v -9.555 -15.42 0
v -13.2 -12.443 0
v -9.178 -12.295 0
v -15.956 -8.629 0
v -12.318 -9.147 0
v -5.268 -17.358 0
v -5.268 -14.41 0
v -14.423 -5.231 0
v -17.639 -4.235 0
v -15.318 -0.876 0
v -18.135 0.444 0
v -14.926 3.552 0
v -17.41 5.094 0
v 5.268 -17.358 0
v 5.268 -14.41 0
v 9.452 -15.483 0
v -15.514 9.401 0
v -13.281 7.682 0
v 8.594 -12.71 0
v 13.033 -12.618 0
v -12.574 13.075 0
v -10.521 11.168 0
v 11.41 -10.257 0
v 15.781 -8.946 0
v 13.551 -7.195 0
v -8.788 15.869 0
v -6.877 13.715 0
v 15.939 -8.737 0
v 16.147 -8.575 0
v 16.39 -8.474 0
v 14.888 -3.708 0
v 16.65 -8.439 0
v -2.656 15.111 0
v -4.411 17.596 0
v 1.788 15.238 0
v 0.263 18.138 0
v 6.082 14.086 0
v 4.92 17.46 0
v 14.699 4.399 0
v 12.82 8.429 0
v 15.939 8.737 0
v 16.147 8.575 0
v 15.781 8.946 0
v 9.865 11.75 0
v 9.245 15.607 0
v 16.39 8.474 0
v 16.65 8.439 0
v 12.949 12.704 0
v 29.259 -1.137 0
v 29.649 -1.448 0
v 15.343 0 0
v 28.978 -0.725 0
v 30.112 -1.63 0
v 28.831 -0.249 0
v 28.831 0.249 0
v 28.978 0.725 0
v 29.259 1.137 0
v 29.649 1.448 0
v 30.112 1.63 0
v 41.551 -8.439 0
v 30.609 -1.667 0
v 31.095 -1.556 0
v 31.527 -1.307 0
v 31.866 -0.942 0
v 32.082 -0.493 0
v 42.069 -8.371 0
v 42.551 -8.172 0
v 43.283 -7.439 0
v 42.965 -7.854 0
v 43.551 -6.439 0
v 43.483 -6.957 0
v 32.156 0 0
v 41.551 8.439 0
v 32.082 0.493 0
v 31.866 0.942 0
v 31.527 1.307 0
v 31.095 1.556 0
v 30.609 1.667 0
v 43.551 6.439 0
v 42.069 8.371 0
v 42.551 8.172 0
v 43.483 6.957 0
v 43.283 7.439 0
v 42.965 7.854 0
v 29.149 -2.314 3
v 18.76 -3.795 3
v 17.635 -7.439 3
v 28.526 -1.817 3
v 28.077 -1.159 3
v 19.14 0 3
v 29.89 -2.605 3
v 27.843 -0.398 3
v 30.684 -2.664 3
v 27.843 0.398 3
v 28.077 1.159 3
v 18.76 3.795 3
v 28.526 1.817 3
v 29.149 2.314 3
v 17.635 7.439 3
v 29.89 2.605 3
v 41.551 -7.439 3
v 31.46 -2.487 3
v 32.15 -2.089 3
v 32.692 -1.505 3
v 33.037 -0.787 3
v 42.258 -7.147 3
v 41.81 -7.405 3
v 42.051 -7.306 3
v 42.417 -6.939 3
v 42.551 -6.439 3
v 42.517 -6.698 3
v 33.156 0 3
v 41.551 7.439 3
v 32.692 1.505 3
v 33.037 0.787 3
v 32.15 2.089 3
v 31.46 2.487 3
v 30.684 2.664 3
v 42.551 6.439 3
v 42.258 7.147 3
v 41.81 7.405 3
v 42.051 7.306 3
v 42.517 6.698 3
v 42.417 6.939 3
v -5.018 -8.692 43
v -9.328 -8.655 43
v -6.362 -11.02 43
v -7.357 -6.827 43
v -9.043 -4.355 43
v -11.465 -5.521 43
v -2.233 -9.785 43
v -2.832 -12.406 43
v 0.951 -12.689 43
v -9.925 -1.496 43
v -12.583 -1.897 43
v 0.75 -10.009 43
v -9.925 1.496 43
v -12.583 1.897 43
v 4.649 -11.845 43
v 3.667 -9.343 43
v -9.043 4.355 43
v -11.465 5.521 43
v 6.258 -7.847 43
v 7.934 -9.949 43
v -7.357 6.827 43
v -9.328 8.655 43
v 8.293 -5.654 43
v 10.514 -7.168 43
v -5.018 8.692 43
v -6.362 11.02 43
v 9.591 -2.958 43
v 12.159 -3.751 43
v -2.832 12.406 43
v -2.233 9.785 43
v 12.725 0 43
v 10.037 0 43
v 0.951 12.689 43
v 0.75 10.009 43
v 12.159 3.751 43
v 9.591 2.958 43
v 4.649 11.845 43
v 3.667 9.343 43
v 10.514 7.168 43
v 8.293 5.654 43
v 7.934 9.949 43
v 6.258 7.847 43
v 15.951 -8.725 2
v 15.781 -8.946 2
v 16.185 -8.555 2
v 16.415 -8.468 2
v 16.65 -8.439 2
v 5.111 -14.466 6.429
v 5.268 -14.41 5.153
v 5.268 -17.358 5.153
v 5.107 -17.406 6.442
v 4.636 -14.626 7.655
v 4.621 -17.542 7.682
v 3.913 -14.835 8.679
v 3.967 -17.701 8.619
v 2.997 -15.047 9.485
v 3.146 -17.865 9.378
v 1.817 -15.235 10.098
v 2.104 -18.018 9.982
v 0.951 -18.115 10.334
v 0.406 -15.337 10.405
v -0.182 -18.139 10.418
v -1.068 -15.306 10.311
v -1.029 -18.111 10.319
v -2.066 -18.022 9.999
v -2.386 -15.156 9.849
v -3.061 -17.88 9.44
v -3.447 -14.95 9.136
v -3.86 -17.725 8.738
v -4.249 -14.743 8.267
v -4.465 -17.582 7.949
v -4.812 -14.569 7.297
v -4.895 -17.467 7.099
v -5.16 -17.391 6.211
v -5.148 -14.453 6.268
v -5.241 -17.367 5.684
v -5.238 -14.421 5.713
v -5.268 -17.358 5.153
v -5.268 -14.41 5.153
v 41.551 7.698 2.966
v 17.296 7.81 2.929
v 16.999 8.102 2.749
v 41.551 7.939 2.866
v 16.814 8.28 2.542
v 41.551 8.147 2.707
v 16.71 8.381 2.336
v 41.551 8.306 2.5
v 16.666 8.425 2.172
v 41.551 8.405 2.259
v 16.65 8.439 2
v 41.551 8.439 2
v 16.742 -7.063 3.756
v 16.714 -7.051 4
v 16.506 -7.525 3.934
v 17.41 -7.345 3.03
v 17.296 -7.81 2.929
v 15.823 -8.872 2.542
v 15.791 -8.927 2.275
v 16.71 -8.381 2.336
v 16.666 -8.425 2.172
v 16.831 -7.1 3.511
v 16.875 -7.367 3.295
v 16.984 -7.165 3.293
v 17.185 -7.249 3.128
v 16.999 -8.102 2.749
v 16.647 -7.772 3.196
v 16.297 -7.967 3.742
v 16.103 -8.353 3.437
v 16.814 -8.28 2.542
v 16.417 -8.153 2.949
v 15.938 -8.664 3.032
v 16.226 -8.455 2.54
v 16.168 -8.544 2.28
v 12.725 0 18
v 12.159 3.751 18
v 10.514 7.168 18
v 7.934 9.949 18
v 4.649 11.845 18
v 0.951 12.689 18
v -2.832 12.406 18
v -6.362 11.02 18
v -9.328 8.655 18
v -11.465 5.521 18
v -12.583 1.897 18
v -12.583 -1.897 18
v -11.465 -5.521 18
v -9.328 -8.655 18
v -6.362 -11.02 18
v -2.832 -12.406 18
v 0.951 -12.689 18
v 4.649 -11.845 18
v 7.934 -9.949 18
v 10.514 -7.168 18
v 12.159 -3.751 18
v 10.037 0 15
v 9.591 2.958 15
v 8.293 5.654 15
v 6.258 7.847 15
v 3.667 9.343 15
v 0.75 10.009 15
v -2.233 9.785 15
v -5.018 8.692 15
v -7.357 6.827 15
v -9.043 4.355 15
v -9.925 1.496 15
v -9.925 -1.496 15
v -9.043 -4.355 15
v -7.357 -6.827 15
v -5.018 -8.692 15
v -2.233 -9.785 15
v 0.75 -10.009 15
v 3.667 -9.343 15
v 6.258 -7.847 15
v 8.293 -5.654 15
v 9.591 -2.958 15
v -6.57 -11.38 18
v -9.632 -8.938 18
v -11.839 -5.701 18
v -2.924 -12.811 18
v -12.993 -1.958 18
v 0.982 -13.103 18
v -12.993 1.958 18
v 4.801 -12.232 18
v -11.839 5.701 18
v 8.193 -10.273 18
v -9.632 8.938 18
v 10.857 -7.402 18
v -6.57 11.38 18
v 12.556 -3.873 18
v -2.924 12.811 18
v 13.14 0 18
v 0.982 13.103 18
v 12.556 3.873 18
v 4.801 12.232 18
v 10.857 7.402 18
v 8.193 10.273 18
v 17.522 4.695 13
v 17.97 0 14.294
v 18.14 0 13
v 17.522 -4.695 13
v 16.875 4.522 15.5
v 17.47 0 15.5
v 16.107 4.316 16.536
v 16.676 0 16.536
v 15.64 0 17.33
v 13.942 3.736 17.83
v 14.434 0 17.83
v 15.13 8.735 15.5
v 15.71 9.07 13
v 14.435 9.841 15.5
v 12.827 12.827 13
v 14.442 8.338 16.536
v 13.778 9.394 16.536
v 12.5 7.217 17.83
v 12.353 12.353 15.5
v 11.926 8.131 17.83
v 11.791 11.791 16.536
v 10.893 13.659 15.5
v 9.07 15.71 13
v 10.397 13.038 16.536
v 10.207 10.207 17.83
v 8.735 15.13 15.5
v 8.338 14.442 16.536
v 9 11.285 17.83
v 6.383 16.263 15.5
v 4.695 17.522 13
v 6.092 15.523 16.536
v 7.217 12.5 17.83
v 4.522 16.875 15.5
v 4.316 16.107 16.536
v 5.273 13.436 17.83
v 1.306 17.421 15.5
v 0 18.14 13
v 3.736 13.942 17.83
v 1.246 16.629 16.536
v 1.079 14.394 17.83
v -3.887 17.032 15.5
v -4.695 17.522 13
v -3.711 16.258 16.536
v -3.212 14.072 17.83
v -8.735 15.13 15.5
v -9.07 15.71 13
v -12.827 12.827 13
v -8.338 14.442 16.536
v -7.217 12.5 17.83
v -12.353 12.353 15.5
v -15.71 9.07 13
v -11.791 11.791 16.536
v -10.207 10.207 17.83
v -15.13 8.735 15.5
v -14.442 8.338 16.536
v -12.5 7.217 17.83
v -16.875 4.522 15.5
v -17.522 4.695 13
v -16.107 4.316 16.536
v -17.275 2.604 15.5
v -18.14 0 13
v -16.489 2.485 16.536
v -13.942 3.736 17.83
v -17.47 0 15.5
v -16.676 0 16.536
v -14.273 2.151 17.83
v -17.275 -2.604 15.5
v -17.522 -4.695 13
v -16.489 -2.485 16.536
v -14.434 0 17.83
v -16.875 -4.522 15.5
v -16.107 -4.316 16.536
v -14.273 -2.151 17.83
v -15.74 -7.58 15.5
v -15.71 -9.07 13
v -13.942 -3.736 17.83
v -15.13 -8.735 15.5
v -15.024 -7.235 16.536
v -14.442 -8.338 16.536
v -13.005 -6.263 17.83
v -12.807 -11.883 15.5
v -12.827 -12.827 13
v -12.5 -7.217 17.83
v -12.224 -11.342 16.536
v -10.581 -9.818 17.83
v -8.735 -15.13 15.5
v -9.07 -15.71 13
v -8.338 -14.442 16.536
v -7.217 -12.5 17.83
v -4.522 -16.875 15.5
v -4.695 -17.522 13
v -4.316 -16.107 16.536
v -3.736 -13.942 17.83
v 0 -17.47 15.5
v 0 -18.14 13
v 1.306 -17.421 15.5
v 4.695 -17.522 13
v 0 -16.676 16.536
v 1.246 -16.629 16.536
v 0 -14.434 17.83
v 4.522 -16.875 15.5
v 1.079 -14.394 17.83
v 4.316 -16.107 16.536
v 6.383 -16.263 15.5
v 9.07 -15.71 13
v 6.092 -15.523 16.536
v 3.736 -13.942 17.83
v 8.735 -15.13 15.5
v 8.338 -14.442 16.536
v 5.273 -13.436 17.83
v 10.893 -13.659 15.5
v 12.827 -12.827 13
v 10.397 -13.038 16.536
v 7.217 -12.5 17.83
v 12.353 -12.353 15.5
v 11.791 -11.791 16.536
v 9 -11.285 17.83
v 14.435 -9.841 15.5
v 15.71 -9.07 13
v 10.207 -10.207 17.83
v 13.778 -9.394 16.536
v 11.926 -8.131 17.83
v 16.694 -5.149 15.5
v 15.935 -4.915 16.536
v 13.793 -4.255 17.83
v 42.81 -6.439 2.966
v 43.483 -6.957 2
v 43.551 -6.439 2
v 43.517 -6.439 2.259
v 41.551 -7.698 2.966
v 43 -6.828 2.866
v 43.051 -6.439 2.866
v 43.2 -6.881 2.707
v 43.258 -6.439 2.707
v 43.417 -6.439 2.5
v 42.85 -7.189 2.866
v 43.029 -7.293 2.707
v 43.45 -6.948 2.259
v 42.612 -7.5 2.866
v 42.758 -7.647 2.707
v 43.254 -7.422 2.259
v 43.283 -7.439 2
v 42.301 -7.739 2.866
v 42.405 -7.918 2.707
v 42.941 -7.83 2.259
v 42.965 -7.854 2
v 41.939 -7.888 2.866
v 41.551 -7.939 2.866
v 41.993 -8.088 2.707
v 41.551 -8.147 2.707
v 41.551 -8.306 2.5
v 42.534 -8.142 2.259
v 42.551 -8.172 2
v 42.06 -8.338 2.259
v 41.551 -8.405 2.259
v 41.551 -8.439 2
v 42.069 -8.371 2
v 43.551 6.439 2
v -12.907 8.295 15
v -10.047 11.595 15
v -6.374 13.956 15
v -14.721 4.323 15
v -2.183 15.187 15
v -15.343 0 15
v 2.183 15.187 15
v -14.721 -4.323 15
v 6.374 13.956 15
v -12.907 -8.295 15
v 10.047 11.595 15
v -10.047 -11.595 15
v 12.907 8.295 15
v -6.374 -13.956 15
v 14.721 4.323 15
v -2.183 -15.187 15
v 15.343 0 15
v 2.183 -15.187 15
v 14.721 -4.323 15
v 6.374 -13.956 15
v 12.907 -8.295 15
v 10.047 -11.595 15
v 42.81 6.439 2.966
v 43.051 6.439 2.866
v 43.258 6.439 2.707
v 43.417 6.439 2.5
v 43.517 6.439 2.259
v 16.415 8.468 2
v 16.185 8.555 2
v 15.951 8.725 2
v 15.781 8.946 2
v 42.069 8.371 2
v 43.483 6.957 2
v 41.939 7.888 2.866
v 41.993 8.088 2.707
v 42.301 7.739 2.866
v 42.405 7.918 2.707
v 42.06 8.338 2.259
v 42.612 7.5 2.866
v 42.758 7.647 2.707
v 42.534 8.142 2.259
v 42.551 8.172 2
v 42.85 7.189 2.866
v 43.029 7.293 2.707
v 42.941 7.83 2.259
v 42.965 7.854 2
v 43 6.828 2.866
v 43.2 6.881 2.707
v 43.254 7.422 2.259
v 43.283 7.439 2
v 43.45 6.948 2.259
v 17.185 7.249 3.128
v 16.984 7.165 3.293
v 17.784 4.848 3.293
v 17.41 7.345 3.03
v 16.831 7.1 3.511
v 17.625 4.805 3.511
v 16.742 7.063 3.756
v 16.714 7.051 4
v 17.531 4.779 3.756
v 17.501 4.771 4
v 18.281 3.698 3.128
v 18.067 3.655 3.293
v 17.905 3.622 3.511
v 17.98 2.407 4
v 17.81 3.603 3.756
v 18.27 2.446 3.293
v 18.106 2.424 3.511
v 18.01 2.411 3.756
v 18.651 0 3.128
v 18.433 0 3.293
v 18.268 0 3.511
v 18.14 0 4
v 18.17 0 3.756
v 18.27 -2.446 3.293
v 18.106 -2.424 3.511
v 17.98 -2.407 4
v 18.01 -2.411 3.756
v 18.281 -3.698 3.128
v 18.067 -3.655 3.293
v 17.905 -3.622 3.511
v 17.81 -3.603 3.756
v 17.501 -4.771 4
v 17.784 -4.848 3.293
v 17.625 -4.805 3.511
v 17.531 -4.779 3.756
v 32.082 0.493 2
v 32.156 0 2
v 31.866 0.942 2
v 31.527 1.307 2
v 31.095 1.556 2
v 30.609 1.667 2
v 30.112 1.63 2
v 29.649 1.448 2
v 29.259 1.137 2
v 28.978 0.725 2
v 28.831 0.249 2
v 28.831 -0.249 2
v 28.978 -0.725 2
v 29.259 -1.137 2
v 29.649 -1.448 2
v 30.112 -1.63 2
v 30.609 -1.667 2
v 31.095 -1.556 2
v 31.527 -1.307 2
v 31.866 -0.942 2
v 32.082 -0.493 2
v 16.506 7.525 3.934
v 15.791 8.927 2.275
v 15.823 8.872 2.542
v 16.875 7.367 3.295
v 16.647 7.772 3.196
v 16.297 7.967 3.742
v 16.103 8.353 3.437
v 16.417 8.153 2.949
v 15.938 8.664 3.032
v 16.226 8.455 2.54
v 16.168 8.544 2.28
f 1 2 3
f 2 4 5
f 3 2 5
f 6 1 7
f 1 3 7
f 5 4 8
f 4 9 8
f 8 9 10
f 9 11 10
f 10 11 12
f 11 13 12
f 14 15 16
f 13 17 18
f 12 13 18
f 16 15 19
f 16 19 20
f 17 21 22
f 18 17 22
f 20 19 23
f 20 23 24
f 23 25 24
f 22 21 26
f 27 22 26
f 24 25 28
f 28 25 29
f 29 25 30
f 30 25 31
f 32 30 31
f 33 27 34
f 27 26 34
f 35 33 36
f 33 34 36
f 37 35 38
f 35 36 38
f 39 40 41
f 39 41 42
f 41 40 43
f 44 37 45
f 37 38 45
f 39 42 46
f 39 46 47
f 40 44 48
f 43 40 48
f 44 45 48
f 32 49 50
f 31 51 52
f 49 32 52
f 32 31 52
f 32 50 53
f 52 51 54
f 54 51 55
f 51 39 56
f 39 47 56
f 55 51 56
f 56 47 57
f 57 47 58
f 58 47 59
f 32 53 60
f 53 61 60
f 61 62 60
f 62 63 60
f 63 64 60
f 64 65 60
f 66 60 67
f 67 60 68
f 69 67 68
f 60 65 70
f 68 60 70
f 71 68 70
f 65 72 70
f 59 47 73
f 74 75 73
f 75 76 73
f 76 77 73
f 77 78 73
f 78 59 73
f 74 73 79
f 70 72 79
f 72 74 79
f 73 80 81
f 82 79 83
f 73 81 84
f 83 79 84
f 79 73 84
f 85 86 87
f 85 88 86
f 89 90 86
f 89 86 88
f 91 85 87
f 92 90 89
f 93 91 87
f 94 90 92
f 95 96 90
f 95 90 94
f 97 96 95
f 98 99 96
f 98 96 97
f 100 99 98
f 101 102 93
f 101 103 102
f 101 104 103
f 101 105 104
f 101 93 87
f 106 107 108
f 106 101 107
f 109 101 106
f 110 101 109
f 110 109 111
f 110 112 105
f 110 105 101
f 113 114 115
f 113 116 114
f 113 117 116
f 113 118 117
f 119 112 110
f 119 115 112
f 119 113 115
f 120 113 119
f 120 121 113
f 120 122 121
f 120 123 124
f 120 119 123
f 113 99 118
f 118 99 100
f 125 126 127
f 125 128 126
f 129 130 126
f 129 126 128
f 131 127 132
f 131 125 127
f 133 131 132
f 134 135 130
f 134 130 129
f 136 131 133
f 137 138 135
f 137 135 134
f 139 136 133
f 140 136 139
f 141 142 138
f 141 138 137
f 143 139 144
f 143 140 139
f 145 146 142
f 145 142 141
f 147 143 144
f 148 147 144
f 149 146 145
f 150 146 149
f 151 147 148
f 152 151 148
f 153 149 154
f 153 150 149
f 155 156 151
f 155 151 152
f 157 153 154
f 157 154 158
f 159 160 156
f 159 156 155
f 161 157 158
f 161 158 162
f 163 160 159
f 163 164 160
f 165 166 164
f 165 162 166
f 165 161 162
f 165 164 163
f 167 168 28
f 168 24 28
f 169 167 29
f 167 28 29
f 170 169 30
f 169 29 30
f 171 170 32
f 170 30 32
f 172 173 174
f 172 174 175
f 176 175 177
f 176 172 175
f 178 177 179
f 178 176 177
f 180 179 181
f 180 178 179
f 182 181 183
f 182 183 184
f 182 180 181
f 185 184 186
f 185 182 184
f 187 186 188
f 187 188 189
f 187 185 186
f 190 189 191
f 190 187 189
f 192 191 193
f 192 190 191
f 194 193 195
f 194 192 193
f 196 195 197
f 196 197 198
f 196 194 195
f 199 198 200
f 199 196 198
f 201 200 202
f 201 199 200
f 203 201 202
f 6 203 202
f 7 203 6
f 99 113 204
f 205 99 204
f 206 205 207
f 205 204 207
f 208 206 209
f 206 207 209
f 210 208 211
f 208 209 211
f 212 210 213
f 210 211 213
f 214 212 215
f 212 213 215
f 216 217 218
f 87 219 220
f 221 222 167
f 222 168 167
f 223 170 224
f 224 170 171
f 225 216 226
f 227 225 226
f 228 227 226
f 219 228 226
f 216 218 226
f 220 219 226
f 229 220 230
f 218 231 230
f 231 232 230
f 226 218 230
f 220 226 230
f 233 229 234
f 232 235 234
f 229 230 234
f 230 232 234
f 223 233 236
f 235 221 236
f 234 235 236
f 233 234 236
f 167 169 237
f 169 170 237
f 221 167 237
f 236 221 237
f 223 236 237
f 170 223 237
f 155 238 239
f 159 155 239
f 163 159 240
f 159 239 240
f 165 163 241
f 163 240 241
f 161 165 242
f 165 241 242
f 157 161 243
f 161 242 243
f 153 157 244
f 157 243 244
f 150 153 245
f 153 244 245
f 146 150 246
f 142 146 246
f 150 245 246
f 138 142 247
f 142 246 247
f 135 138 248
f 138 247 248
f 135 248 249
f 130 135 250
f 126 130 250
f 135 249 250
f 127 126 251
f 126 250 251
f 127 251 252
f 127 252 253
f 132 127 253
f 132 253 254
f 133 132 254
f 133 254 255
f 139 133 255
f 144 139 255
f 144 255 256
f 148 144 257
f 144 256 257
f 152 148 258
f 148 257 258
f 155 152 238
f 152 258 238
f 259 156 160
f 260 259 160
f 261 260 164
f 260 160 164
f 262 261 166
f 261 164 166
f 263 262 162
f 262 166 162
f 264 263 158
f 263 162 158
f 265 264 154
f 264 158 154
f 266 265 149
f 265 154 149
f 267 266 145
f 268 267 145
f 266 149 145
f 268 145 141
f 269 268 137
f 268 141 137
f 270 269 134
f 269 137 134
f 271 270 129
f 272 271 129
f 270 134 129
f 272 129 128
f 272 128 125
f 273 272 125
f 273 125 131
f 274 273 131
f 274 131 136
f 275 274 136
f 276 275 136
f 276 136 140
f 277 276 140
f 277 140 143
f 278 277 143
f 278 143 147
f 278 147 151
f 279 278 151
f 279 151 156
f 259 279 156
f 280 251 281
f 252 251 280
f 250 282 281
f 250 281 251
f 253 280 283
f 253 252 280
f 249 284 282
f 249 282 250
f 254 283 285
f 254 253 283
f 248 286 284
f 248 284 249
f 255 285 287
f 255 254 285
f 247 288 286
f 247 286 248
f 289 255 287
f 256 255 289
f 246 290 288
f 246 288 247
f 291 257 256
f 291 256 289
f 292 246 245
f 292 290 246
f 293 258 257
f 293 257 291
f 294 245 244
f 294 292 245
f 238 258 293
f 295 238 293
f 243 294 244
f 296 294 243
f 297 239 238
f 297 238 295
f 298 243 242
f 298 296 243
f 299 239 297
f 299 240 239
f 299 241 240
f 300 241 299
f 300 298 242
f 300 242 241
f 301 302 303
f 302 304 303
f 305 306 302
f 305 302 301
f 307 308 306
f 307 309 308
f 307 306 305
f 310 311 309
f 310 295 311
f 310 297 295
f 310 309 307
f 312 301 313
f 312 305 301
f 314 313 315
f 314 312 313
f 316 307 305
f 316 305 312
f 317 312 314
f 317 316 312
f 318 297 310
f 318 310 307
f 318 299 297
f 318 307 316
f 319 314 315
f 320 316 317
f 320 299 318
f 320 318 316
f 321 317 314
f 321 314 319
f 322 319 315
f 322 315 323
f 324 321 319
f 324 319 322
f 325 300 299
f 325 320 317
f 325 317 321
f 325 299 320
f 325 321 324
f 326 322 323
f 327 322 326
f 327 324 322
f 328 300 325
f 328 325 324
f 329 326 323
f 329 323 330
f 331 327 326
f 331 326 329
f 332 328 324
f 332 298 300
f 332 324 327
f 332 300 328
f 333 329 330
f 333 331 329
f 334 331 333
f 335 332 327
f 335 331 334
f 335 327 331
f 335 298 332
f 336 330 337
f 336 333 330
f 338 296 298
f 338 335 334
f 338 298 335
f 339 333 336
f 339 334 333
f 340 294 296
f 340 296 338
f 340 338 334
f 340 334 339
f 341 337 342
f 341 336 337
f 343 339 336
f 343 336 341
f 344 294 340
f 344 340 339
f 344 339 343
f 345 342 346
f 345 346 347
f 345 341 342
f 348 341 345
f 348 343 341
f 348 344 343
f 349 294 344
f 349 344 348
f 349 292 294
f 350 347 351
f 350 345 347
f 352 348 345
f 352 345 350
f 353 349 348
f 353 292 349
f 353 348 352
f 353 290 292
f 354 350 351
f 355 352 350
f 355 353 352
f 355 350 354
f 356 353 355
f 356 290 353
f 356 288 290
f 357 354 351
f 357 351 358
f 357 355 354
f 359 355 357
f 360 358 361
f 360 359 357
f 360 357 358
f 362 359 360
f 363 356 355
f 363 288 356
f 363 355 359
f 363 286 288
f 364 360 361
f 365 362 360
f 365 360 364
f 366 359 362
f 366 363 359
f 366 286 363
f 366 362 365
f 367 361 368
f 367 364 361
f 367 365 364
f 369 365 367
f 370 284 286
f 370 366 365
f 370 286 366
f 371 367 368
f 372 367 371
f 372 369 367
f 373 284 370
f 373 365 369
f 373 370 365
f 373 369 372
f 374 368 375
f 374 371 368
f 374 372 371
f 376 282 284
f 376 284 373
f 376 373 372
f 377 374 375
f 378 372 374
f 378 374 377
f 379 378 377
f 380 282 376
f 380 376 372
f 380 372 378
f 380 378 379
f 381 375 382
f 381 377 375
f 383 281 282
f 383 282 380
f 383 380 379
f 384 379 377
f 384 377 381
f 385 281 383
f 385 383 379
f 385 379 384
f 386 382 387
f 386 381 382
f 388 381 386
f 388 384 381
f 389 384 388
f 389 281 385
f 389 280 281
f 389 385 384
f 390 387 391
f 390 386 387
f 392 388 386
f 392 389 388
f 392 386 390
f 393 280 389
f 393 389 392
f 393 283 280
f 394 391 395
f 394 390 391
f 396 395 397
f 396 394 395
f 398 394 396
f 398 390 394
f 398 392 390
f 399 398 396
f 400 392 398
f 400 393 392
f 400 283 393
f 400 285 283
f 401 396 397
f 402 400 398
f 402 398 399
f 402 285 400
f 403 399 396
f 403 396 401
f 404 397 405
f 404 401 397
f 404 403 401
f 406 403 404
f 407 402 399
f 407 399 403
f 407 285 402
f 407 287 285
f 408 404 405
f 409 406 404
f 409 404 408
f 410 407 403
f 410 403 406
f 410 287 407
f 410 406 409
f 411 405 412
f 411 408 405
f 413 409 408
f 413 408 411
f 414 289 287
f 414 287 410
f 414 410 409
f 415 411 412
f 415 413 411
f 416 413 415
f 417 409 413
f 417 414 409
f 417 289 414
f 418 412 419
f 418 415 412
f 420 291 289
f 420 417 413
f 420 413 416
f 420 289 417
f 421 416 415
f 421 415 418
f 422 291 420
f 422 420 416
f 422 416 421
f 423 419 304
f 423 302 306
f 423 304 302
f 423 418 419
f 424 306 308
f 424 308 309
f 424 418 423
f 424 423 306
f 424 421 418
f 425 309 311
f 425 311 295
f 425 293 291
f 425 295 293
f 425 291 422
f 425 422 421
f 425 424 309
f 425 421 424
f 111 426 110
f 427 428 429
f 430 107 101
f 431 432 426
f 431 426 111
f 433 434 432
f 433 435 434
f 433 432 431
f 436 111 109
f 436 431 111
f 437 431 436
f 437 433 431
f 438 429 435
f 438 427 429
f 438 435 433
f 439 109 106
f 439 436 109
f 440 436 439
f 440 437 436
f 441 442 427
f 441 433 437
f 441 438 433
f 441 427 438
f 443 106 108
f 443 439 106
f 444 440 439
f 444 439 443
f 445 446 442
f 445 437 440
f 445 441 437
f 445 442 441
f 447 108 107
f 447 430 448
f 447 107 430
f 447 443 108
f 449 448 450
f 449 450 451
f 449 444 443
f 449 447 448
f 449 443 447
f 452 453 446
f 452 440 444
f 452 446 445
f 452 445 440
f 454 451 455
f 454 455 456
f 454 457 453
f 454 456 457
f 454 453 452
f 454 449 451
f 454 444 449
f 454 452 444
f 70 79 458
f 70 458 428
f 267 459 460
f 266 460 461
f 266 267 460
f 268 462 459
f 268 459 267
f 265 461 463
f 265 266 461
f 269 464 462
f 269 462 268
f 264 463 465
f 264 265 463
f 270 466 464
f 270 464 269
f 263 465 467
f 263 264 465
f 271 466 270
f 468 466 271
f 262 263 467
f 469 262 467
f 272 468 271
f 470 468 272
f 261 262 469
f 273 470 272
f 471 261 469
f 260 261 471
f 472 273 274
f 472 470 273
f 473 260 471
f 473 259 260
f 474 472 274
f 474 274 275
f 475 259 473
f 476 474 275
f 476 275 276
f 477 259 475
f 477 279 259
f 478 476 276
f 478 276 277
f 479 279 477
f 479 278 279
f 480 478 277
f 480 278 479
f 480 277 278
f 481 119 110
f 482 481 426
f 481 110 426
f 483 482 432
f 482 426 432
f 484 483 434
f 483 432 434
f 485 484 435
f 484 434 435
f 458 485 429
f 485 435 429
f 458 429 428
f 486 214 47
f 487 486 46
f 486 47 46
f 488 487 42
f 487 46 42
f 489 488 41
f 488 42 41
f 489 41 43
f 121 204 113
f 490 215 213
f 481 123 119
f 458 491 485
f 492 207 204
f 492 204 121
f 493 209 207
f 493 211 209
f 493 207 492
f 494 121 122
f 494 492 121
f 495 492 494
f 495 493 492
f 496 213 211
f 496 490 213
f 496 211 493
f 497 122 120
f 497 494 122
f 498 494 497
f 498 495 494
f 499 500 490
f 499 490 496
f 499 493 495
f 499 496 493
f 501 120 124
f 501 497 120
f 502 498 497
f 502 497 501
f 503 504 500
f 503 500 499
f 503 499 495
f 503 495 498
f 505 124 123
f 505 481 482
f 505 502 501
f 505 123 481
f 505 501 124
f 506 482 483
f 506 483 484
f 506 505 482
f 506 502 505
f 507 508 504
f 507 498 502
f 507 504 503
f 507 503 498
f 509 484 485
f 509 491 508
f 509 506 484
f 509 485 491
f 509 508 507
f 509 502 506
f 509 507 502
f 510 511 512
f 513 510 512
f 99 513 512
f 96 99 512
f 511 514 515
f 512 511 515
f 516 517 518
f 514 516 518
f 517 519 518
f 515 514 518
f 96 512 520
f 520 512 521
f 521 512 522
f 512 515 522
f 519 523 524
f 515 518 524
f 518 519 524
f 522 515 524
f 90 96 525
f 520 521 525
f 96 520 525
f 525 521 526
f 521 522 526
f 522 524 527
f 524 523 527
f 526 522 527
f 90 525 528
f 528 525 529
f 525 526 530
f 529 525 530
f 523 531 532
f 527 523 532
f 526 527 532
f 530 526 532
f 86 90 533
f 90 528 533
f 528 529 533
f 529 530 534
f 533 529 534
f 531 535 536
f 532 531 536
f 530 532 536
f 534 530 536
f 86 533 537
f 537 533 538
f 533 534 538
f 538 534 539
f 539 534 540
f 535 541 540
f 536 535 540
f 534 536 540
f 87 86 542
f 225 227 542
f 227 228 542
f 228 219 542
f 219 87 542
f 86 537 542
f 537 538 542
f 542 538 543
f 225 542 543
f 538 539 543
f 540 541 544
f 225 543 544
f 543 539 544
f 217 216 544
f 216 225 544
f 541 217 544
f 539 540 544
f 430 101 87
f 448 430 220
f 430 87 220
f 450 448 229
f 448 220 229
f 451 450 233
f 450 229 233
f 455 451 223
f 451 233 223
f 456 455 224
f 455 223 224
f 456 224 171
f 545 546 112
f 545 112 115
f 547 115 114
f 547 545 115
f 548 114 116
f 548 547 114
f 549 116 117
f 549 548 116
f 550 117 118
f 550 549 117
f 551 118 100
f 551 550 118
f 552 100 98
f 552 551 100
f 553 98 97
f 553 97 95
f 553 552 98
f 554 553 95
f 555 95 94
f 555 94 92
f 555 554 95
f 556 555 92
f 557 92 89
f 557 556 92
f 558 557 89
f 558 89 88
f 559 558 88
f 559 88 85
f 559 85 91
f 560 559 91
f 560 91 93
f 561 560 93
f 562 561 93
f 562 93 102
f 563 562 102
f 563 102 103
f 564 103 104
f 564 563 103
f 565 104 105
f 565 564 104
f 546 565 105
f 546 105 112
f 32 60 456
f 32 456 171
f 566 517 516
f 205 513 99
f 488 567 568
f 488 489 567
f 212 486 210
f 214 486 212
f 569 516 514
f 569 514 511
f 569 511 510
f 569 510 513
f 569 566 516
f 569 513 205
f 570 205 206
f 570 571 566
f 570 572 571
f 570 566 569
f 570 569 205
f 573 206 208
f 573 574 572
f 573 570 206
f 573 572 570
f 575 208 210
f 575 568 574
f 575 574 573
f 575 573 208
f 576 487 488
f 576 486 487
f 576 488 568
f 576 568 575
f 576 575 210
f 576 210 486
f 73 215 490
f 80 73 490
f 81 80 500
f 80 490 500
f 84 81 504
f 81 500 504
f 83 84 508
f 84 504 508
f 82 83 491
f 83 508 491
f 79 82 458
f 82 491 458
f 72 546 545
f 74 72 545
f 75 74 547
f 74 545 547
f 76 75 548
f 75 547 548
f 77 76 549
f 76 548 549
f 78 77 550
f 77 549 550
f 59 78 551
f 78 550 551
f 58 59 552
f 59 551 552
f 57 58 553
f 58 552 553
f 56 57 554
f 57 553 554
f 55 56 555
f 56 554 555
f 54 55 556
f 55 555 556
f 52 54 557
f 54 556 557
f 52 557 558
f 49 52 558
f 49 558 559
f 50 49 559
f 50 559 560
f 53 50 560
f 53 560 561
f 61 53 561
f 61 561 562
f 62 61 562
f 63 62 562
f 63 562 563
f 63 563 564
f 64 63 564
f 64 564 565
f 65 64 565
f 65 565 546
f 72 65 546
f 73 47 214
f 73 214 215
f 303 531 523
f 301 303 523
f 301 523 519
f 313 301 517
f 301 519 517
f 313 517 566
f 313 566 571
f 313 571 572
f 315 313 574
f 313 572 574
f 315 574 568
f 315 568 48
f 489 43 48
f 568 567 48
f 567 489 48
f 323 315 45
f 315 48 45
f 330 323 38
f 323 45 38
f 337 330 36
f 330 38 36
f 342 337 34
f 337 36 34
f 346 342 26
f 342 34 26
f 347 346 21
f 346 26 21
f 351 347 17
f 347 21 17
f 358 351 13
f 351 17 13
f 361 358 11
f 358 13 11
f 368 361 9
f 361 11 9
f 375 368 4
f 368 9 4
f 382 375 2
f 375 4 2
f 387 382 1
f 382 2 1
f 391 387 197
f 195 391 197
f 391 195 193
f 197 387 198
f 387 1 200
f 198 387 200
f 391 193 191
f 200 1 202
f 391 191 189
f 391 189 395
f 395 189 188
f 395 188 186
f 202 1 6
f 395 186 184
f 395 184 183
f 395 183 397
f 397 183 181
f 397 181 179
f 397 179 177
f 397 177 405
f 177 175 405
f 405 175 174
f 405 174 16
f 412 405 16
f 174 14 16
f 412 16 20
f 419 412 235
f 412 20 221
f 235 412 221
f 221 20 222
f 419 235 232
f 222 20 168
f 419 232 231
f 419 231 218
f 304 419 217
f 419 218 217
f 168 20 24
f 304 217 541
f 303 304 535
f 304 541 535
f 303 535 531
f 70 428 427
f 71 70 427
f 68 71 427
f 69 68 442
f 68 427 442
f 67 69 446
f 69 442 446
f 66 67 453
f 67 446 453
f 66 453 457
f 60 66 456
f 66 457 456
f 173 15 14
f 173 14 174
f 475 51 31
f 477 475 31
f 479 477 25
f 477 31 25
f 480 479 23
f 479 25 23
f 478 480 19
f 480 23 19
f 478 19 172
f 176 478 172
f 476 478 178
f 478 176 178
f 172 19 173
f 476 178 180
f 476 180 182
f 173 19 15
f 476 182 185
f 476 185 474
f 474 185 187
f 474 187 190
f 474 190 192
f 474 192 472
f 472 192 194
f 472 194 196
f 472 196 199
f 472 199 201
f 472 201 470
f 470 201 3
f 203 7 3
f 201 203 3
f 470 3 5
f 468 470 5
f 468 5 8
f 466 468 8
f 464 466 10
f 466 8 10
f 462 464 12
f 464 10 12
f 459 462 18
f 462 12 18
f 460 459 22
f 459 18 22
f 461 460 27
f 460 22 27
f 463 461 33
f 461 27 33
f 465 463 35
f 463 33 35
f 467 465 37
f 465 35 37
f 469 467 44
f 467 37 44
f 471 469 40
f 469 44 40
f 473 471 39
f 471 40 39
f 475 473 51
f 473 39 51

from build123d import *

# Parameters (mm, degrees)
PAD_DEPTH       = 3
SKETCH001_R     = 18.140088
PAD001_DEPTH    = 18
SKETCH002_R     = 12.72475
PAD002_DEPTH    = 25
FILLET_R        = 5
SKETCH003_R     = 10.036661
POCKET_DEPTH    = 39
SKETCH004_R     = 15.342719
POCKET001_DEPTH = 15
SKETCH005_R     = 1.671602
POCKET002_DEPTH = 9
CHAMFER_SIZE    = 1
POCKET003_DEPTH = 24
FILLET001_R     = 2
FILLET002_R     = 1


with BuildPart() as part:
    # Sketch → Pad (new body)
    with BuildSketch(Plane.XY):
        with BuildLine():
            ThreePointArc((15.819927, 8.439493), (-17.930285, 0), (15.819927, -8.439493))
            Line((43.550961, -8.439493), (15.819927, -8.439493))
            Line((43.550961, 8.439493), (43.550961, -8.439493))
            Line((15.819927, 8.439493), (43.550961, 8.439493))
        make_face()
    extrude(amount=PAD_DEPTH)

    # Sketch001 (on Face6 of Pad) → Pad001 (join)
    with BuildSketch(Plane.XY):
        Circle(SKETCH001_R)
    extrude(amount=PAD001_DEPTH)

    # Sketch002 (on Face9 of Pad001) → Pad002 (join)
    with BuildSketch(Plane.XY.offset(18)):
        Circle(SKETCH002_R)
    extrude(amount=PAD002_DEPTH)

    # Fillet
    fillet_edges = [part.edges().sort_by_distance(p)[0] for p in [
        (-18.140088, 0, 18),
    ]]
    fillet(fillet_edges, radius=FILLET_R)

    # Sketch003 (on Face12 of Fillet) → Pocket (cut)
    with BuildSketch(Plane.XY.offset(43)):
        Circle(SKETCH003_R)
    extrude(amount=-POCKET_DEPTH, mode=Mode.SUBTRACT)

    # Sketch004 (on Face10 of Pocket) → Pocket001 (cut)
    with BuildSketch(Plane(origin=(0, 0, 0), x_dir=(1, 0, 0), z_dir=(0, 0, -1))):
        Circle(SKETCH004_R)
    extrude(amount=-POCKET001_DEPTH, mode=Mode.SUBTRACT)

    # Sketch005 (on Face3 of Pocket001) → Pocket002 (cut)
    with BuildSketch(Plane.XY.offset(3)):
        with Locations((30.484385, 0)):
            Circle(SKETCH005_R)
    extrude(amount=-POCKET002_DEPTH, mode=Mode.SUBTRACT)

    # Chamfer
    chamfer_edges = [part.edges().sort_by_distance(p)[0] for p in [
        (28.812783, 0, 3),
    ]]
    chamfer(chamfer_edges, length=CHAMFER_SIZE)

    # Sketch006 → Pocket003 (cut)
    with BuildSketch(Plane.XZ):
        with BuildLine():
            ThreePointArc((5.267581, 5.153194), (0, 10.420775), (-5.267581, 5.153194))
            Line((-5.267581, 5.153194), (-5.267581, -7.655472))
            ThreePointArc((-5.267581, -7.655472), (0, -12.923053), (5.267581, -7.655472))
            Line((5.267581, -7.655472), (5.267581, 5.153194))
        make_face()
    extrude(amount=POCKET003_DEPTH, mode=Mode.SUBTRACT)

    # Fillet001
    fillet001_edges = [part.edges().sort_by_distance(p)[0] for p in [
        (43.550961, -8.439493, 1.5),
        (43.550961, 8.439493, 1.5),
    ]]
    fillet(fillet001_edges, radius=FILLET001_R)

    # Fillet002
    fillet002_edges = [part.edges().sort_by_distance(p)[0] for p in [
        (28.804144, -8.439493, 3),
        (28.804144, 8.439493, 3),
        (17.611702, -4.346347, 3),
        (17.611702, 4.346347, 3),
        (16.057327, -8.439493, 1.5),
        (42.965175, -7.853707, 3),
        (43.550961, 0, 3),
        (42.965175, 7.853707, 3),
        (16.057327, 8.439493, 1.5),
    ]]
    fillet(fillet002_edges, radius=FILLET002_R)


solid = part.part
